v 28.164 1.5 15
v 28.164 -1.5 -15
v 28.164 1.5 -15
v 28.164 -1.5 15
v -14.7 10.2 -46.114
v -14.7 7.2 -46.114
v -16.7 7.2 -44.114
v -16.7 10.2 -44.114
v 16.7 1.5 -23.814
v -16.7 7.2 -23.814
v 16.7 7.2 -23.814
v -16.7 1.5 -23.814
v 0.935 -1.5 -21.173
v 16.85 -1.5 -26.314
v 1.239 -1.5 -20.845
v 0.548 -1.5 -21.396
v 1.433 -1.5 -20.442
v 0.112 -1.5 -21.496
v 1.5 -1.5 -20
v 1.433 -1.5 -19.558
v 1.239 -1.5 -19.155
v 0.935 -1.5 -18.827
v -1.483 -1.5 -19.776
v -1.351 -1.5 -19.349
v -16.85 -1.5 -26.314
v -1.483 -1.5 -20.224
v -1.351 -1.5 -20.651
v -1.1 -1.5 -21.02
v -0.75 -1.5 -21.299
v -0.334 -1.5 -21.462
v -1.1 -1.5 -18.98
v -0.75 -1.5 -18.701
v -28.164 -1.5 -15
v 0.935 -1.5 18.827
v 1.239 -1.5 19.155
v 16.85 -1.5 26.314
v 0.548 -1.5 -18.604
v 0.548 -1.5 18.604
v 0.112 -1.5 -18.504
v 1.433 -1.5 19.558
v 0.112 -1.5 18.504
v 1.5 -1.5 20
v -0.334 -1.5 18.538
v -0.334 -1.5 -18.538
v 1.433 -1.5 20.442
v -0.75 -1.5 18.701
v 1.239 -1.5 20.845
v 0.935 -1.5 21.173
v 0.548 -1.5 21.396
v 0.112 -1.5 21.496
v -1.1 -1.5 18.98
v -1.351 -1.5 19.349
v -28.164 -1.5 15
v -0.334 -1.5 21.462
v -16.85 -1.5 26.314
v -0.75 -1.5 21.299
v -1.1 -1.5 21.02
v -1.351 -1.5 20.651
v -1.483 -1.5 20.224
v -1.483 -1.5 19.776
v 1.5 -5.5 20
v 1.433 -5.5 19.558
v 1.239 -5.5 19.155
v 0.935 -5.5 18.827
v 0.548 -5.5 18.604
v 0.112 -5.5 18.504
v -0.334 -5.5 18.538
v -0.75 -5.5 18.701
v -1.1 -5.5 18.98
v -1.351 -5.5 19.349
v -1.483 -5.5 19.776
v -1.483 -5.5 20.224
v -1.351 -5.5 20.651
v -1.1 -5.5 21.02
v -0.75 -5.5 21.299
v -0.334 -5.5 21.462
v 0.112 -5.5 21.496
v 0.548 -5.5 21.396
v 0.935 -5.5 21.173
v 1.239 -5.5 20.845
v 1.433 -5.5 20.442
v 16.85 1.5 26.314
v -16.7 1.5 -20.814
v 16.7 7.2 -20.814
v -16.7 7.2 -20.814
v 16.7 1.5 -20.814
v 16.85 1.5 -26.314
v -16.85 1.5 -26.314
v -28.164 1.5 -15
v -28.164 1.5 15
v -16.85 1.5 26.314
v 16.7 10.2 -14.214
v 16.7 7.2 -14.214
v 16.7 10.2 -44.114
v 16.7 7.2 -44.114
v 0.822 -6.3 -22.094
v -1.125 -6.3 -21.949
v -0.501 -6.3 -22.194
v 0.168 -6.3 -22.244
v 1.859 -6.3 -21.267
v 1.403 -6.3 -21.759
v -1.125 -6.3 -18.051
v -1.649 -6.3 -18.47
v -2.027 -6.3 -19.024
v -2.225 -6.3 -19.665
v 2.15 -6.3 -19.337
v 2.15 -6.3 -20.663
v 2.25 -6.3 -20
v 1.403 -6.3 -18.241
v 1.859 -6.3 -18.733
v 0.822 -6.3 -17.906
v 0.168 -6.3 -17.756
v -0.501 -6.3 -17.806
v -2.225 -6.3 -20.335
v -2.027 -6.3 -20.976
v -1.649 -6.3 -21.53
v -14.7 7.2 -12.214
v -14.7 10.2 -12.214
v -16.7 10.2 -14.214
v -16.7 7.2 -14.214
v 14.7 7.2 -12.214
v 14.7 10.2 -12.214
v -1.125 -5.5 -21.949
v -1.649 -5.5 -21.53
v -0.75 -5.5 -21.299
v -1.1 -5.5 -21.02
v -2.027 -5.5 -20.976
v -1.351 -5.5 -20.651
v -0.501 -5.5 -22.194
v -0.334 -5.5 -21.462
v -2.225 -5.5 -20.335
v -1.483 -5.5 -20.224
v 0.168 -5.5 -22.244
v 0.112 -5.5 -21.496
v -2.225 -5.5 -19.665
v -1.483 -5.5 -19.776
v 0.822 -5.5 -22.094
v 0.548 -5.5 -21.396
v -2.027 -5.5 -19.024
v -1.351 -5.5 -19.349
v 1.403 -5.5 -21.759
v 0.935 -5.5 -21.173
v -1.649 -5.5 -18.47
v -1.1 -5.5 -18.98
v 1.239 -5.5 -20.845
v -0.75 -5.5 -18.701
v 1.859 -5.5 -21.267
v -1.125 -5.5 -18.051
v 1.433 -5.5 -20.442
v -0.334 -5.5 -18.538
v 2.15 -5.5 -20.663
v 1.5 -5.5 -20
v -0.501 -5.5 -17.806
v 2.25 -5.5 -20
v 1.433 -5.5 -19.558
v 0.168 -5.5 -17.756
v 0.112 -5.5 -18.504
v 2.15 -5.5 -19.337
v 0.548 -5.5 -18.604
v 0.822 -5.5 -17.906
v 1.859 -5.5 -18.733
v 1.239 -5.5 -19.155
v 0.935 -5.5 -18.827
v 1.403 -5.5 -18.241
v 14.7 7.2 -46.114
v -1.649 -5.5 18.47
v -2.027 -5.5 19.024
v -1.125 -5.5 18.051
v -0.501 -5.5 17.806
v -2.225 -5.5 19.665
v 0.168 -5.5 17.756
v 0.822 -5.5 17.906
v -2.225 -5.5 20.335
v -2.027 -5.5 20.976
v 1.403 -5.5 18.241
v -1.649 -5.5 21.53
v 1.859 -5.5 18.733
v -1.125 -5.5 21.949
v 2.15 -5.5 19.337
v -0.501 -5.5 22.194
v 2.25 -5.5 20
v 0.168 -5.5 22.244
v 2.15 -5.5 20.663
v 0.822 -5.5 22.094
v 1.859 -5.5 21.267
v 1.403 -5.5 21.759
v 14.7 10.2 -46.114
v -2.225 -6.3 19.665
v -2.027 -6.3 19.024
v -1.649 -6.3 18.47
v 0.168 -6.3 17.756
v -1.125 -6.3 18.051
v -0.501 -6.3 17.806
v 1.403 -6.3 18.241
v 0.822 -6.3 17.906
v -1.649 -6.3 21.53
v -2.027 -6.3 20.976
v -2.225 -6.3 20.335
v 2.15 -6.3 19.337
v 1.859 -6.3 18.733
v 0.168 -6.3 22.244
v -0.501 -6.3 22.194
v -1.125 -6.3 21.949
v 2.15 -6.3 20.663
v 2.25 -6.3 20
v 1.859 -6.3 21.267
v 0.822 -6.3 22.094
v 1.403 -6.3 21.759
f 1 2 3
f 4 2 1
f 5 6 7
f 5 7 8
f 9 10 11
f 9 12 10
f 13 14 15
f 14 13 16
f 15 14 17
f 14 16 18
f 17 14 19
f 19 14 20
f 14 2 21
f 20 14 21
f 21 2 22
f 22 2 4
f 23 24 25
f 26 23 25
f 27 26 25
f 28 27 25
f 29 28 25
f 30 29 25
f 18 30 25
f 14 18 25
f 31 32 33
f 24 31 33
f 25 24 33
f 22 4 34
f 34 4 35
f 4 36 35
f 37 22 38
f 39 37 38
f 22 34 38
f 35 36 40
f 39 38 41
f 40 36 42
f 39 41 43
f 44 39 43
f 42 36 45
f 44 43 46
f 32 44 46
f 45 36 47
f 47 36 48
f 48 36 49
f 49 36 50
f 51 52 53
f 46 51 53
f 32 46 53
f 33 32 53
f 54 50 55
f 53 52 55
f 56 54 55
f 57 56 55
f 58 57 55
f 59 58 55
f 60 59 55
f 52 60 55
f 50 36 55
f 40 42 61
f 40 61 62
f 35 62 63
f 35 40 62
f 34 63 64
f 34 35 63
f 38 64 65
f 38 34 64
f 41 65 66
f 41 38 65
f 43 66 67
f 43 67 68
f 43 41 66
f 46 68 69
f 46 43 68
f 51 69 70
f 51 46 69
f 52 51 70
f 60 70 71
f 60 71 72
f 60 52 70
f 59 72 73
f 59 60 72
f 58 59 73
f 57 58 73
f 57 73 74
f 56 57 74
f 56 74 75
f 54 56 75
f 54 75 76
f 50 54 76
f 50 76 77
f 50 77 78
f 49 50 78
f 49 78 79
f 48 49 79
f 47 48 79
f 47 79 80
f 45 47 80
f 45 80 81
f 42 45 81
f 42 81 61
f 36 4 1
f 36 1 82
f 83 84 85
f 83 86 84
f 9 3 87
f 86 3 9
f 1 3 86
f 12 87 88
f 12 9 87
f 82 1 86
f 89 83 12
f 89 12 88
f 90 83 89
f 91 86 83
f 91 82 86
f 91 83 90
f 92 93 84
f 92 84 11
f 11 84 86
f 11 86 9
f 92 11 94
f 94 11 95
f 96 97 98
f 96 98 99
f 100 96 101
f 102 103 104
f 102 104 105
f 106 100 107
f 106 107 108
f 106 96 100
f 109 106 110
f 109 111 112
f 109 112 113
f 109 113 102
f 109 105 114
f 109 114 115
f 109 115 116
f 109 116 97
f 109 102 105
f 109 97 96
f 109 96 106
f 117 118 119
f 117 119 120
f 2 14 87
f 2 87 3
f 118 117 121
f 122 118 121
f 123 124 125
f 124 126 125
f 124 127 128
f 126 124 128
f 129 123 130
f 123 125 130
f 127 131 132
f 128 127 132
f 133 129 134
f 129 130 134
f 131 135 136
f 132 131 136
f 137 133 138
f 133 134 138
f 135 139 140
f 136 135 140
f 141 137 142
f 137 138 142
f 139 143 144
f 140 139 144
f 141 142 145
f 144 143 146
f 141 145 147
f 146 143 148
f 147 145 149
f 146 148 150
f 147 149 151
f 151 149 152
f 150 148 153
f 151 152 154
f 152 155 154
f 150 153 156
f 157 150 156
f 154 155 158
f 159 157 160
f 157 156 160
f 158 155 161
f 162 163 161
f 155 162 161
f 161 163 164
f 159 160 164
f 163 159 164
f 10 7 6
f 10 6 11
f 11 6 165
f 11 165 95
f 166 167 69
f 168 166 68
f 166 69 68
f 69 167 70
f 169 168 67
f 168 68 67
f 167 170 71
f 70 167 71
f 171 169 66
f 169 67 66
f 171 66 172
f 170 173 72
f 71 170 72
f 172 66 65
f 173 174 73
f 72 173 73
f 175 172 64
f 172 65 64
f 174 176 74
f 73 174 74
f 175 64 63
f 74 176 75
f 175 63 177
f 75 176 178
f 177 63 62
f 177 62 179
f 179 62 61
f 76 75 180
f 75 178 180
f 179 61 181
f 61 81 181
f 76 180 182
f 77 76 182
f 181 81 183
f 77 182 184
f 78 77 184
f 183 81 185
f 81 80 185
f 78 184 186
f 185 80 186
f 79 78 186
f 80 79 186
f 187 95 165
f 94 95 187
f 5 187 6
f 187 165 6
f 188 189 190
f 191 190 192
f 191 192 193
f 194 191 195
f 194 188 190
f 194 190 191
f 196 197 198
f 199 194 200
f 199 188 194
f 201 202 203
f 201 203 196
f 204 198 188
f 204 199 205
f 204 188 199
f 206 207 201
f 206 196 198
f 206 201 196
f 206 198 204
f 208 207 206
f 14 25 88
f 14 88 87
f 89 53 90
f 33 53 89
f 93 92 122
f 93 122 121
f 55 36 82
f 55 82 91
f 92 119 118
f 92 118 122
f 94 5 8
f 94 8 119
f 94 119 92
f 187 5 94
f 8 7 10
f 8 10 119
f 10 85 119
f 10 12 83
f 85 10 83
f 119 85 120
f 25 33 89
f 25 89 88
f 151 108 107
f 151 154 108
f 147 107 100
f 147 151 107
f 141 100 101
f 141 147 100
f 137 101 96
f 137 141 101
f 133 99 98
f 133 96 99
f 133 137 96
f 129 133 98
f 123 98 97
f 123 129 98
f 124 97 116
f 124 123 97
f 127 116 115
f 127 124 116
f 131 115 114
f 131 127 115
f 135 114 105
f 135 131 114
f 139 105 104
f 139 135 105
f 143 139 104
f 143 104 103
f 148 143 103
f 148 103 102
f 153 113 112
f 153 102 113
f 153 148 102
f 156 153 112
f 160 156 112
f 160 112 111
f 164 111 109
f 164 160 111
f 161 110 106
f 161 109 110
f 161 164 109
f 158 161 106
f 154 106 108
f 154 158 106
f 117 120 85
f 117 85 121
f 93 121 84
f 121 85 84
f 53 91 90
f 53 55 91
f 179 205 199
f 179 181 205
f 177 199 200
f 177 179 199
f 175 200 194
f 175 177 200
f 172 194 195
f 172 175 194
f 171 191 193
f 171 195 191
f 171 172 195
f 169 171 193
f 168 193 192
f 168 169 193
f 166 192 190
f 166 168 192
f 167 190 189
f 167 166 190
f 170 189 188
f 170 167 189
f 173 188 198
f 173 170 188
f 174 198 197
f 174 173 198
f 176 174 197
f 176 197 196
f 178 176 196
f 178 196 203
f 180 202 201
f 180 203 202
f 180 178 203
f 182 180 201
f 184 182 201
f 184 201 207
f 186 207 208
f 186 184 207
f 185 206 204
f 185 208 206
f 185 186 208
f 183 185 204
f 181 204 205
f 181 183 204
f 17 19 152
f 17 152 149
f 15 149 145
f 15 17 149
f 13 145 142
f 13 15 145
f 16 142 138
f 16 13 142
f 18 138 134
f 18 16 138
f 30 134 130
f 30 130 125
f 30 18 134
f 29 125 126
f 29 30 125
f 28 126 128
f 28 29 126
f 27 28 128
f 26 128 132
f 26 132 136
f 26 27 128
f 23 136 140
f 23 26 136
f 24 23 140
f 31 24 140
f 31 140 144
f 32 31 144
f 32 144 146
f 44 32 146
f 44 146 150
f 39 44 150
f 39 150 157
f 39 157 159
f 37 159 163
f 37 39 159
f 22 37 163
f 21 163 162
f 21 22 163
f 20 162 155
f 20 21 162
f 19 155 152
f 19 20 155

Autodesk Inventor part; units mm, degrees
ref_plane "YZ Plane" through (0, 0, 0) normal (1, 0, 0) x (0, 1, 0)
ref_plane "XZ Plane" through (0, 0, 0) normal (0, 1, 0) x (-1, 0, 0)
ref_plane "XY Plane" through (0, 0, 0) normal (0, 0, 1) x (1, 0, 0)
sketch "Sketch1" plane through (0, 0, 0) normal (0, 1, 0) x (-1, 0, 0)
  line L0 (16.85, -26.3137) -> (-16.85, -26.3137)
  line L1 (-16.85, -26.3137) -> (-28.1637, -15)
  line L2 (-28.1637, -15) -> (-28.1637, 15)
  line L3 (-28.1637, 15) -> (-16.85, 26.3137)
  line L4 (-16.85, 26.3137) -> (16.85, 26.3137)
  line L5 (16.85, 26.3137) -> (28.1637, 15)
  line L6 (28.1637, 15) -> (28.1637, -15)
  line L7 (28.1637, -15) -> (16.85, -26.3137)
  point P0 (0, 0)
  point P1 (0, -26.3137)
  point P2 (28.1637, 0)
  point P3 (-28.1637, 0)
  point P4 (0, 26.3137)
  dimension "d2" = 30
  dimension "d6" = 16
  dimension "d7" = 16
  dimension "d9" = 16
  dimension "d10" = 16
  dimension "d11" = 135
  dimension "d12" = 135
  dimension "d13" = 135
  dimension "d14" = 135
  dimension "d15" = 30
  dimension "d16" = 33.7
  dimension "d17" = 33.7
extrude "Extrusion1" add sketch "Sketch1" along normal mid plane 3
sketch "Sketch2" plane through (0, 1.5, 0) normal (0, 1, 0) x (1, 0, 0)
  line L0 (-16.7, 23.8137) -> (16.7, 23.8137)
  line L1 (16.7, 23.8137) -> (16.7, 20.8137)
  line L2 (16.7, 20.8137) -> (-16.7, 20.8137)
  line L3 (-16.7, 20.8137) -> (-16.7, 23.8137)
  line L4 (16.85, 26.3137) -> (-16.85, 26.3137) projected
  point P0 (0, 0)
  point P1 (0, 23.8137)
  point P2 (0, 26.3137)
  dimension "d20" = 33.4
  dimension "d21" = 3
  dimension "d22" = 2.5
extrude "Extrusion2" add sketch "Sketch2" along normal blind 5.7
sketch "Sketch4" plane through (0, 7.2, 0) normal (0, 1, 0) x (1, 0, 0)
  line L0 (-16.7, 12.2137) -> (16.7, 12.2137)
  line L1 (16.7, 12.2137) -> (16.7, 46.1137)
  line L2 (16.7, 46.1137) -> (-16.7, 46.1137)
  line L3 (-16.7, 46.1137) -> (-16.7, 12.2137)
  line L4 (-16.7, 23.8137) -> (-16.7, 20.8137) projected
  line L5 (16.7, 20.8137) -> (16.7, 23.8137) projected
  line L6 (-16.7, 20.8137) -> (16.7, 20.8137) projected
  line L7 (16.7, 23.8137) -> (-16.7, 23.8137) projected
  point P0 (0, 0)
  dimension "d25" = 8.6
  dimension "d26" = 22.3
extrude "Extrusion3" add sketch "Sketch4" along normal blind 3
chamfer "Chamfer1" distance 2 angle 45 4 edges at (-16.7, 8.7, -46.1137) (16.7, 8.7, -46.1137) (-16.7, 8.7, -12.2137) (16.7, 8.7, -12.2137)
sketch "Sketch5" plane through (0, -1.5, 0) normal (0, -1, 0) x (1, 0, 0)
  circle A0 centre (0, -20) radius 1.5
  circle A1 centre (0, 20) radius 1.5
  line L0 (-28.1637, -15) -> (-28.1637, 15) projected
  line L1 (-28.1637, 18.5) -> (28.1637, 18.5)
  line L2 (28.1637, -15) -> (28.1637, 15) projected
  line L3 (-28.1637, -18.5) -> (28.1637, -18.5)
  line L4 (-28.1637, 21.5) -> (28.1637, 21.5)
  line L5 (-28.1637, -21.5) -> (28.1637, -21.5)
  point P0 (0, 0)
  dimension "d34" = 3
  dimension "d35" = 3
  dimension "d42" = 43
  dimension "d43" = 21.5
  dimension "d44" = 37
  dimension "d45" = 18.5
extrude "Extrusion4" add sketch "Sketch5" along normal blind 4
sketch "Sketch6" plane through (0, -5.5, -20) normal (0, -1, 0) x (1, 0, 0)
  circle A0 centre (0, 0) radius 1.5 projected
  circle A1 centre (0, 0) radius 2.25
  circle A2 centre (0, 40) radius 1.5 projected
  circle A3 centre (0, 40) radius 2.25
  point P0 (0, 20)
  dimension "d38" = 4.5
  dimension "d39" = 4.5
extrude "Extrusion5" add sketch "Sketch6" along normal blind 0.8 contours A0 | A1 | A2 | A3
equation "\"d2\" = d0"
equation "\"d35\" = d34"
equation "\"d43\" = 0.5 * d42"
equation "\"d45\" = 0.5 * d44"
equation "\"d39\" = d38"
equation "\"d0\" = 30"
properties part number "Maker-Bot-Raspberry-Pi-Holder"
